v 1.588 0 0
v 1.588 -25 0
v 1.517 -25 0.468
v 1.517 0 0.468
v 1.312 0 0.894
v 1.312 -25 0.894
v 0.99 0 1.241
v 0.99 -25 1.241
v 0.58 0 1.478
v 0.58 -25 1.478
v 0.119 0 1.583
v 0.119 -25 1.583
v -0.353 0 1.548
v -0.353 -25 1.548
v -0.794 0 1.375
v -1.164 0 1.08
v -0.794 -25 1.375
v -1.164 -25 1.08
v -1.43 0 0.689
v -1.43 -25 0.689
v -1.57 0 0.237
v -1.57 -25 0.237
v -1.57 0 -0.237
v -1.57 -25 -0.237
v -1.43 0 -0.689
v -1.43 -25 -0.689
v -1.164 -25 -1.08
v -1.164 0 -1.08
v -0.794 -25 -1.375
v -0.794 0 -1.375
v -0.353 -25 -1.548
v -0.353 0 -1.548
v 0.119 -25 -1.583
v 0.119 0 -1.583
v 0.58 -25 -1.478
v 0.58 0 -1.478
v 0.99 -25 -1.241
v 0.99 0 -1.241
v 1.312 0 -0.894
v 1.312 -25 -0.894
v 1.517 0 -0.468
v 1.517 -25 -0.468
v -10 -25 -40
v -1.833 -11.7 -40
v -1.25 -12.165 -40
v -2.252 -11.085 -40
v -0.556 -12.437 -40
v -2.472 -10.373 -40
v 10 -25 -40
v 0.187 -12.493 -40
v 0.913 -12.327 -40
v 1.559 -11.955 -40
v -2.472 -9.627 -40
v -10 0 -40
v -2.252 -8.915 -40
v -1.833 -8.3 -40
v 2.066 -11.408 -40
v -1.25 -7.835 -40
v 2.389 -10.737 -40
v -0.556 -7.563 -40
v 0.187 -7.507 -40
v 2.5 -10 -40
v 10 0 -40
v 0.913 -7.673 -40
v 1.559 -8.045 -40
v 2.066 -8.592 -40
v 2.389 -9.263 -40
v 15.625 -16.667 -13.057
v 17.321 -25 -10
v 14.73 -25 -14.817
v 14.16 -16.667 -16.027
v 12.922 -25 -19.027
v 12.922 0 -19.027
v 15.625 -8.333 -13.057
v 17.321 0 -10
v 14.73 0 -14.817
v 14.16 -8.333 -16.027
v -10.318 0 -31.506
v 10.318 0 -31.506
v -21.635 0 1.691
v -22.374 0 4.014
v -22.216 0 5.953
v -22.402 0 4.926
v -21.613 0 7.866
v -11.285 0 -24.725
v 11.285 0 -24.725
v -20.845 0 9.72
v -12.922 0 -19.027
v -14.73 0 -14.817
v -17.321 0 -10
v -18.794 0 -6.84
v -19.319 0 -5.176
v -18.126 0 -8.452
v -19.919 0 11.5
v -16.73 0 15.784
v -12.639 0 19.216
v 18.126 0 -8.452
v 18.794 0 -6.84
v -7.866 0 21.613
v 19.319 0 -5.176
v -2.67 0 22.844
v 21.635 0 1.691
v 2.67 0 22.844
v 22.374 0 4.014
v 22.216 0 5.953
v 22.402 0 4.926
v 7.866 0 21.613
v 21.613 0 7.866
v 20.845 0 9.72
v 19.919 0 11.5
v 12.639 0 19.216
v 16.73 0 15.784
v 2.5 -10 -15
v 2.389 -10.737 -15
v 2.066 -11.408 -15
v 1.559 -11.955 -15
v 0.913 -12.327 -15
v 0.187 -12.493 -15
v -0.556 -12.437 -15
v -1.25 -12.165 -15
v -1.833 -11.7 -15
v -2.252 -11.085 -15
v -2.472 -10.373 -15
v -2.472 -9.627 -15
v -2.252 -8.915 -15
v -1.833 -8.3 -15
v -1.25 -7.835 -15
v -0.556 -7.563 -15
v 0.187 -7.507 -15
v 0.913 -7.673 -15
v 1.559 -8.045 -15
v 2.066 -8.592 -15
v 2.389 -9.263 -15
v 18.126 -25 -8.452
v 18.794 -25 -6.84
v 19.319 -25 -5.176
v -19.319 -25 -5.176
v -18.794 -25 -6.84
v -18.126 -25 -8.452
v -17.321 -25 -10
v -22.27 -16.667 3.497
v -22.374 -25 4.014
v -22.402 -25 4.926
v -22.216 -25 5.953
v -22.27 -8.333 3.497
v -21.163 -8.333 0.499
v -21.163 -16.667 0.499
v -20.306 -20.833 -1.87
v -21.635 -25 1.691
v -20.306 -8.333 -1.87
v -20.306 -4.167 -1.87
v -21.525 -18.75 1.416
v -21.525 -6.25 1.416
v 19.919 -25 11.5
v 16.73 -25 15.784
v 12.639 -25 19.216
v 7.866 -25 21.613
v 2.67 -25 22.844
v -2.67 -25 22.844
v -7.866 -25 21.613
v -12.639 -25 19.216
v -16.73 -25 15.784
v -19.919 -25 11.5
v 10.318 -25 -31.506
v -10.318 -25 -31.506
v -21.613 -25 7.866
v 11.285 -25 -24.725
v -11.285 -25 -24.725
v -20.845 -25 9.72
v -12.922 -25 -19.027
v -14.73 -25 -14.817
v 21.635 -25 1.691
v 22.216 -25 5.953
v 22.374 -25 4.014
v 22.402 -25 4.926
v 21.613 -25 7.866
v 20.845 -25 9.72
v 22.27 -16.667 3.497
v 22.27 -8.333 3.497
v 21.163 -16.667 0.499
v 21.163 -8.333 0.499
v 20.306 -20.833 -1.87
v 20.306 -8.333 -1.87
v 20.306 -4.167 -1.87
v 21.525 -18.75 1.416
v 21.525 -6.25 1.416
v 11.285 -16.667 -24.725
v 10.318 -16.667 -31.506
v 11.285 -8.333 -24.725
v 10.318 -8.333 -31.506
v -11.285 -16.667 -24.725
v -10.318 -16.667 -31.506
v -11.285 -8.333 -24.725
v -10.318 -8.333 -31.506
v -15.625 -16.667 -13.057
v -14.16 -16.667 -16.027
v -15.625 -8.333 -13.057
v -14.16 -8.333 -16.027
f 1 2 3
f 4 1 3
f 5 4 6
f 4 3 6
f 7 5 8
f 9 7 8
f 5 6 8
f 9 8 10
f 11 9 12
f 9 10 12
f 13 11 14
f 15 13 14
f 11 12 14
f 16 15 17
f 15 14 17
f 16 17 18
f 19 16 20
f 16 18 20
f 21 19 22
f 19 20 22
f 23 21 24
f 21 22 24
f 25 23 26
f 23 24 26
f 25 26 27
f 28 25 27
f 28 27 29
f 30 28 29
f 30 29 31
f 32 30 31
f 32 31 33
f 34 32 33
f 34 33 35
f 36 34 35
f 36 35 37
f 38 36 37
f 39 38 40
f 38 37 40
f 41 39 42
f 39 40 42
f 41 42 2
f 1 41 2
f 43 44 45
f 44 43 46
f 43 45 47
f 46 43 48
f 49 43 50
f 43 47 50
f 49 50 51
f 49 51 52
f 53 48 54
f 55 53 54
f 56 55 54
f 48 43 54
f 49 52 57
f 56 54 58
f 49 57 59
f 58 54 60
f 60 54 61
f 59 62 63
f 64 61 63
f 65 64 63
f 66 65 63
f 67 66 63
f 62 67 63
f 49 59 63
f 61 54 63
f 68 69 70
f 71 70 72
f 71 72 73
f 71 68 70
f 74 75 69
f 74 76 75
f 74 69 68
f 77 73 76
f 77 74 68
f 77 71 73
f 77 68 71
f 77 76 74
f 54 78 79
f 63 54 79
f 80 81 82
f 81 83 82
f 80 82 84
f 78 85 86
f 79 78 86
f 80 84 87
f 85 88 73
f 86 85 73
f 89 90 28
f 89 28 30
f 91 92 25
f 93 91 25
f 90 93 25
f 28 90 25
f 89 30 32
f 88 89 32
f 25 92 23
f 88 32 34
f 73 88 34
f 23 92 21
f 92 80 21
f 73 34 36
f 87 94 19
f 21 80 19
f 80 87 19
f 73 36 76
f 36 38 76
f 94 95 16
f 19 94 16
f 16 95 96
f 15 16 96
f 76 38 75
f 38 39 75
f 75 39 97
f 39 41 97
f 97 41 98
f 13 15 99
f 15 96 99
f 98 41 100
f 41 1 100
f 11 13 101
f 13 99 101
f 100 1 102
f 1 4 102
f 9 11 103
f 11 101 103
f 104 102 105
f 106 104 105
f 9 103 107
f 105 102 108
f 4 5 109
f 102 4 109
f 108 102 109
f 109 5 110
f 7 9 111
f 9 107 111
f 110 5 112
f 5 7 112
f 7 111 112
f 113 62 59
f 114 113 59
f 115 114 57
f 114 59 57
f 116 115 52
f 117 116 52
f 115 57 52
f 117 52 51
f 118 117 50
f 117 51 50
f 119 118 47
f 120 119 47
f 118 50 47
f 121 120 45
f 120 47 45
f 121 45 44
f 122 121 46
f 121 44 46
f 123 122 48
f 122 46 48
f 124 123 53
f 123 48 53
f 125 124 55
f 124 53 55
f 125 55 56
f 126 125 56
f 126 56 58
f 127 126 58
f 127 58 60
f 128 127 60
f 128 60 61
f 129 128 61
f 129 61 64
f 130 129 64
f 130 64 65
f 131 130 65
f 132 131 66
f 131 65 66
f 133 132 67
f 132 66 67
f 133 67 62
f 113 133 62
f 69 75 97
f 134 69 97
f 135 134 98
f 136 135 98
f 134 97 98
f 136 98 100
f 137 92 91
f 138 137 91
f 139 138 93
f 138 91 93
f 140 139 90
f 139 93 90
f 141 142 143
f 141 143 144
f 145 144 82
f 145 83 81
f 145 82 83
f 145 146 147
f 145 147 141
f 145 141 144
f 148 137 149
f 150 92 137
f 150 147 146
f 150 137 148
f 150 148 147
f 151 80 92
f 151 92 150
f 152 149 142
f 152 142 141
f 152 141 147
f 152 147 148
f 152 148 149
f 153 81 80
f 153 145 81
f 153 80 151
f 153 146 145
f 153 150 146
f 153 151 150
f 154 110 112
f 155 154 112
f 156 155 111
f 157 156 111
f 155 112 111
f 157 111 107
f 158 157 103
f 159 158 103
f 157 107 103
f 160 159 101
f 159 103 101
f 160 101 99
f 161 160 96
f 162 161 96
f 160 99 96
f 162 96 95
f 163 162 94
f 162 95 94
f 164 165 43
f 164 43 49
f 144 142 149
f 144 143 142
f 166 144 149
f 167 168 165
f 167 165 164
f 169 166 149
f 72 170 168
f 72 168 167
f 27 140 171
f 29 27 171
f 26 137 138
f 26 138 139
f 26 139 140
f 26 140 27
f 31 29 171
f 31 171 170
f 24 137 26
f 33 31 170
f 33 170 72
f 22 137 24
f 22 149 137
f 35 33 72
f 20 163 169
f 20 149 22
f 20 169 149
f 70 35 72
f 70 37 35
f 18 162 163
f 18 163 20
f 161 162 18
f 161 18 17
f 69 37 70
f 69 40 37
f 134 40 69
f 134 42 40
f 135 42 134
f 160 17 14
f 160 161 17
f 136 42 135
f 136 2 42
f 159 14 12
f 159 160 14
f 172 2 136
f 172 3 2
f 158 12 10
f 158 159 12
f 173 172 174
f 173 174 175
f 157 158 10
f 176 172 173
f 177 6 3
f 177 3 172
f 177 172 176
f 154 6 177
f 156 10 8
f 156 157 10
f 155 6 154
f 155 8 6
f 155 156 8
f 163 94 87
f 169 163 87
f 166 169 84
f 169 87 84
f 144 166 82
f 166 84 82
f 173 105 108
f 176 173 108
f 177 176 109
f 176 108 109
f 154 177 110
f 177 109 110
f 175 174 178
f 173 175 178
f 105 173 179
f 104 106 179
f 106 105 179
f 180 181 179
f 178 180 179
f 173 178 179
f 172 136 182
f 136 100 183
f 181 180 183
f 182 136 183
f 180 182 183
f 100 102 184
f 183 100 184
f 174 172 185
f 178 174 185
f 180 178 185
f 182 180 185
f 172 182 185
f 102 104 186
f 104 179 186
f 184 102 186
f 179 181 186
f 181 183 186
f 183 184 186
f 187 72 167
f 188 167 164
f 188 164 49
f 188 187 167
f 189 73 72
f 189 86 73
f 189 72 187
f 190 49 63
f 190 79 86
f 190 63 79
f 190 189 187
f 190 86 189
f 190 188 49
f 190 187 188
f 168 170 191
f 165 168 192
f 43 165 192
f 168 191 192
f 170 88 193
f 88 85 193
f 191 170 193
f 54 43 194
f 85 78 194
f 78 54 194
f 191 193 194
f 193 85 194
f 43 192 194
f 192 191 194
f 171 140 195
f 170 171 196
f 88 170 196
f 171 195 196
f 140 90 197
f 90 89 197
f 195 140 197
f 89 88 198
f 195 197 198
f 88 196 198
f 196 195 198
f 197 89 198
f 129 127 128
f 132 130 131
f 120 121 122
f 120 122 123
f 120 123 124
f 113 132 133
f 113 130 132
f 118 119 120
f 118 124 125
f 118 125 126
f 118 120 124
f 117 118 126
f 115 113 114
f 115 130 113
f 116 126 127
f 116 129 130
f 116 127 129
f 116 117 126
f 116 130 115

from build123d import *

# Parameters (mm, degrees)
F1_DEPTH = 25
F2_R     = 1.5875
F3_DEPTH = 25
F4_R     = 2.5
F5_DEPTH = 25


with BuildPart() as f1:
    # F0 (on Front) → F1 (new body)
    with BuildSketch(Plane.XZ):
        with BuildLine():
            Line((-17.3205080757, 10), (0, 0))
            Line((0, 0), (17.3205080757, 10))
            ThreePointArc((17.3205080757, 10), (0, 20), (-17.3205080757, 10))
        make_face()
        with BuildLine():
            ThreePointArc((19.918584287, 11.5), (0, 23), (-19.918584287, 11.5))
            Line((-19.918584287, 11.5), (-17.3205080757, 10))
            ThreePointArc((-17.3205080757, 10), (0, 20), (17.3205080757, 10))
            Line((17.3205080757, 10), (19.918584287, 11.5))
        make_face()
        with BuildLine():
            Line((19.3185165258, 5.1763809021), (22.2162940046, 5.9528380374))
            ThreePointArc((22.2162940046, 5.9528380374), (21.2492292478, 8.8017189444), (19.918584287, 11.5))
            Line((19.918584287, 11.5), (17.3205080757, 10))
            ThreePointArc((17.3205080757, 10), (18.4775906502, 7.6536686473), (19.3185165258, 5.1763809021))
        make_face()
        with BuildLine():
            Line((17.3205080757, 10), (0, 0))
            Line((0, 0), (19.3185165258, 5.1763809021))
            ThreePointArc((19.3185165258, 5.1763809021), (18.4775906502, 7.6536686473), (17.3205080757, 10))
        make_face()
        with BuildLine():
            Line((0, 0), (19.3185165258, -5.1763809021))
            ThreePointArc((19.3185165258, -5.1763809021), (19.8288972275, -2.6105238444), (20, 0))
            ThreePointArc((20, 0), (19.8288972275, 2.6105238444), (19.3185165258, 5.1763809021))
            Line((19.3185165258, 5.1763809021), (0, 0))
        make_face()
        with BuildLine():
            add(Edge.make_bspline(
                [(19.3185165258, -5.1763809021), (21.3890688866, 2.5510257083), (22.99275114, 3.0550605585), (22.2162940046, 5.9528380374)],
                knots=[0, 0, 0, 0, 11.5002881928, 11.5002881928, 11.5002881928, 11.5002881928], degree=3))
            Line((22.2162940046, 5.9528380374), (19.3185165258, 5.1763809021))
            ThreePointArc((19.3185165258, 5.1763809021), (19.8288972275, 2.6105238444), (20, 0))
            ThreePointArc((20, 0), (19.8288972275, -2.6105238444), (19.3185165258, -5.1763809021))
        make_face()
        with BuildLine():
            Line((0, 0), (17.3205080757, -10))
            ThreePointArc((17.3205080757, -10), (18.4775906502, -7.6536686473), (19.3185165258, -5.1763809021))
            Line((19.3185165258, -5.1763809021), (0, 0))
        make_face()
        with BuildLine():
            ThreePointArc((-17.3205080757, -10), (0, -20), (17.3205080757, -10))
            Line((17.3205080757, -10), (0, 0))
            Line((0, 0), (-17.3205080757, 10))
            ThreePointArc((-17.3205080757, 10), (-19.8288972275, 2.6105238444), (-19.3185165258, -5.1763809021))
            ThreePointArc((-19.3185165258, -5.1763809021), (-18.4775906502, -7.6536686473), (-17.3205080757, -10))
        make_face()
        with BuildLine():
            Line((-10, -40), (10, -40))
            add(Edge.make_bspline(
                [(12.9220055275, -19.0268697674), (10.9430027849, -24.3950055717), (10, -30.4378356334), (10, -40)],
                knots=[11.1947815786, 11.1947815786, 11.1947815786, 11.1947815786, 30.8802499745, 30.8802499745, 30.8802499745, 30.8802499745], degree=3))
            ThreePointArc((12.9220055275, -19.0268697674), (0, -23), (-12.9220055275, -19.0268697674))
            add(Edge.make_bspline(
                [(-12.9220055275, -19.0268697674), (-10.9430027849, -24.3950055717), (-10, -30.4378356334), (-10, -40)],
                knots=[11.1947815786, 11.1947815786, 11.1947815786, 11.1947815786, 30.8802499745, 30.8802499745, 30.8802499745, 30.8802499745], degree=3))
        make_face()
        with BuildLine():
            ThreePointArc((-12.9220055275, -19.0268697674), (0, -23), (12.9220055275, -19.0268697674))
            add(Edge.make_bspline(
                [(17.3205080757, -10), (15.5078961979, -13.1395358667), (14.0474297746, -15.9741048241), (12.9220055275, -19.0268697674)],
                knots=[0, 0, 0, 0, 11.1947815786, 11.1947815786, 11.1947815786, 11.1947815786], degree=3))
            ThreePointArc((17.3205080757, -10), (0, -20), (-17.3205080757, -10))
            add(Edge.make_bspline(
                [(-17.3205080757, -10), (-15.5078961979, -13.1395358667), (-14.0474297746, -15.9741048241), (-12.9220055275, -19.0268697674)],
                knots=[0, 0, 0, 0, 11.1947815786, 11.1947815786, 11.1947815786, 11.1947815786], degree=3))
        make_face()
        with BuildLine():
            ThreePointArc((-19.918584287, 11.5), (-21.2492292478, 8.8017189444), (-22.2162940046, 5.9528380374))
            add(Edge.make_bspline(
                [(-19.3185165258, -5.1763809021), (-21.3890688866, 2.5510257083), (-22.99275114, 3.0550605585), (-22.2162940046, 5.9528380374)],
                knots=[0, 0, 0, 0, 11.5002881928, 11.5002881928, 11.5002881928, 11.5002881928], degree=3))
            ThreePointArc((-19.3185165258, -5.1763809021), (-19.8288972275, 2.6105238444), (-17.3205080757, 10))
            Line((-17.3205080757, 10), (-19.918584287, 11.5))
        make_face()
    extrude(amount=F1_DEPTH)

    # F2 (on face) → F3 (cut)
    with BuildSketch(Plane.XZ.offset(25)):
        Circle(F2_R)
    extrude(amount=-F3_DEPTH, mode=Mode.SUBTRACT)

    # F4 (on face) → F5 (cut)
    with BuildSketch(Plane(origin=(0, 0, -40), x_dir=(1, 0, 0), z_dir=(0, 0, -1))):
        with Locations((0, 10)):
            Circle(F4_R)
    extrude(amount=-F5_DEPTH, mode=Mode.SUBTRACT)


solid = f1.part
